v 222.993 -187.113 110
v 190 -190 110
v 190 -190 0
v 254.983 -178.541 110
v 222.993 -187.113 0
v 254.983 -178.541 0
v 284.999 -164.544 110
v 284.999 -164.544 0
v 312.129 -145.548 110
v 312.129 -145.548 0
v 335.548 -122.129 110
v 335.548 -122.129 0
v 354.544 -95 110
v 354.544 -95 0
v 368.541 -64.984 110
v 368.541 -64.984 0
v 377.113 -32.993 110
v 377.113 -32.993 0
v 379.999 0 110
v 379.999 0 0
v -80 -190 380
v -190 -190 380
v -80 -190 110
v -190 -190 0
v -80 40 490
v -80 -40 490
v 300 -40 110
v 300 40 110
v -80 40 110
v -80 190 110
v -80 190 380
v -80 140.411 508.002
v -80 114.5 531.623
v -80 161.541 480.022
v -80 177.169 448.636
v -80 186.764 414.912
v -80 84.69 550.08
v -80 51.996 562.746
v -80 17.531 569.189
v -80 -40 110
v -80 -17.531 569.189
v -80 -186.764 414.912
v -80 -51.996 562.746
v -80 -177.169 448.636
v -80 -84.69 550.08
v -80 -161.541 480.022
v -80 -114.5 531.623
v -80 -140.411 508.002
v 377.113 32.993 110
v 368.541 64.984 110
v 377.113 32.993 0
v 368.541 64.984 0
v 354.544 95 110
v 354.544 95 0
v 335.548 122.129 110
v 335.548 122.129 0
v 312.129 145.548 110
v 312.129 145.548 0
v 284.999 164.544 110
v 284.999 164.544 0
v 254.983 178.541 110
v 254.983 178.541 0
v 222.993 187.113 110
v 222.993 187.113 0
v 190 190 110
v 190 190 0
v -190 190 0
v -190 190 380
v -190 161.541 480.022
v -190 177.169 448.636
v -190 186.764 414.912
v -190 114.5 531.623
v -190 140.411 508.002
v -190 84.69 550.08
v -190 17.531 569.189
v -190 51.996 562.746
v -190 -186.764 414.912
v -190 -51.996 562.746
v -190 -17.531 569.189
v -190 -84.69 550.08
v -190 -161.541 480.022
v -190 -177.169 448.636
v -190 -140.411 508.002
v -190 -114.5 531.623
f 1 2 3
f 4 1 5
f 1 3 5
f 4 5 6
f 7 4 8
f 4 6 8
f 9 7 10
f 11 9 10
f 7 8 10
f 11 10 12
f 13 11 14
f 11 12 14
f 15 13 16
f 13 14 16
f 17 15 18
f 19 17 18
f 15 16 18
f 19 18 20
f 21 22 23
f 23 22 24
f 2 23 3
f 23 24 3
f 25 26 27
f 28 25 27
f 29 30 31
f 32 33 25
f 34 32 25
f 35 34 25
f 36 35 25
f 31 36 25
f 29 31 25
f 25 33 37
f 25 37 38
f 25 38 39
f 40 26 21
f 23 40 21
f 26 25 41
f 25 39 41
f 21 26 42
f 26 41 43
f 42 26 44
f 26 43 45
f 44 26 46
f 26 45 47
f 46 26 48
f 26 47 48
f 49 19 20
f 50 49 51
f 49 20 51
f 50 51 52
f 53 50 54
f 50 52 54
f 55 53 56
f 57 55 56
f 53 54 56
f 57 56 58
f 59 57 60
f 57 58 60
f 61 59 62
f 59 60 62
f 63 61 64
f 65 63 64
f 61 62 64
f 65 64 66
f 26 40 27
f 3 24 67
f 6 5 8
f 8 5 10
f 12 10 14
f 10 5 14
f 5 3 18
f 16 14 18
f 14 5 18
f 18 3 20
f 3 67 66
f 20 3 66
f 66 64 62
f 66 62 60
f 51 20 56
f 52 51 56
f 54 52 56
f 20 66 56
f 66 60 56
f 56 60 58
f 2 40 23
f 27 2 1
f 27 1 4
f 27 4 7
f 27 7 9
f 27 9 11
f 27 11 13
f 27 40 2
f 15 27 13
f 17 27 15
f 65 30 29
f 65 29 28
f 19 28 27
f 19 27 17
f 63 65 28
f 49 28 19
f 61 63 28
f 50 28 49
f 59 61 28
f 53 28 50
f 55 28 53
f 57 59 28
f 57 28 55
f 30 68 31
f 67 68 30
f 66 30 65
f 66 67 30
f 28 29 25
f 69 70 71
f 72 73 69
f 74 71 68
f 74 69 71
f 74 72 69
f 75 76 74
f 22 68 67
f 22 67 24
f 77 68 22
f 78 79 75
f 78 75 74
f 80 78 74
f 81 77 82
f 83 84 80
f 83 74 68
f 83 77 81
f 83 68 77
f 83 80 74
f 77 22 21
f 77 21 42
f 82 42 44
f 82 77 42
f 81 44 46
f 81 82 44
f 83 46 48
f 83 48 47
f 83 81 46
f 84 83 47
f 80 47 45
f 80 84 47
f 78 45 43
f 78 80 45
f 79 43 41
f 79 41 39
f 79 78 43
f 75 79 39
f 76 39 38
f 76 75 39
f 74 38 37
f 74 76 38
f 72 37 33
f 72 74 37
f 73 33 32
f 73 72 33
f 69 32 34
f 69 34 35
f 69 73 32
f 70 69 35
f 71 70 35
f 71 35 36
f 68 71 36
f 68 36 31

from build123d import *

# Parameters (mm, degrees)
F1_DEPTH = 110.000034
F2_W     = 110
F2_H     = 379.99924
F3_DEPTH = 270
F5_DEPTH = 110
F6_W     = 380
F6_H     = 80
F7_DEPTH = 380
F9_DEPTH = 80


with BuildPart() as f1:
    # F0 (on Top) → F1 (new body)
    with BuildSketch(Plane.XY):
        with BuildLine():
            ThreePointArc((189.99962, -189.99962), (0, 0), (189.99962, 189.99962))
            Line((189.99962, 189.99962), (-189.99962, 189.99962))
            Line((-189.99962, 189.99962), (-189.99962, -189.99962))
            Line((-189.99962, -189.99962), (189.99962, -189.99962))
        make_face()
        with BuildLine():
            ThreePointArc((379.99924, 0), (324.34964, 134.35002), (189.99962, 189.99962))
            Line((189.99962, 189.99962), (189.99962, -189.99962))
            ThreePointArc((189.99962, -189.99962), (324.34964, -134.35002), (379.99924, 0))
        make_face()
        with BuildLine():
            Line((189.99962, -189.99962), (189.99962, 189.99962))
            ThreePointArc((189.99962, 189.99962), (0, 0), (189.99962, -189.99962))
        make_face()
    extrude(amount=F1_DEPTH)

    # F2 (on face) → F3 (join)
    with BuildSketch(Plane.XY.offset(110.000034)):
        with Locations((-134.99962, 0)):
            Rectangle(F2_W, F2_H)
    extrude(amount=F3_DEPTH)

    # F4 (on face) → F5 (join)
    with BuildSketch(Plane(origin=(-189.99962, 0, 0), x_dir=(0, -1, 0), z_dir=(-1, 0, 0))):
        with BuildLine():
            Line((-189.99962, 380.000034), (189.99962, 380.000034))
            ThreePointArc((189.99962, 380.000034), (0, 569.99924), (-189.99962, 380.000034))
        make_face()
    extrude(amount=-F5_DEPTH)

    # F6 (on face) → F7 (join)
    with BuildSketch(Plane.XY.offset(110.000034)):
        with Locations((110.00038, -0.00038)):
            Rectangle(F6_W, F6_H)
    extrude(amount=F7_DEPTH)

    # F8 (on face) → F9 (cut, through all)
    with BuildSketch(Plane.XZ.offset(40.00038)):
        Polygon((300.00038, 490.000034), (-79.99962, 490.000034), (300.00038, 110.000034), align=None)
    extrude(amount=-F9_DEPTH, mode=Mode.SUBTRACT)


solid = f1.part
